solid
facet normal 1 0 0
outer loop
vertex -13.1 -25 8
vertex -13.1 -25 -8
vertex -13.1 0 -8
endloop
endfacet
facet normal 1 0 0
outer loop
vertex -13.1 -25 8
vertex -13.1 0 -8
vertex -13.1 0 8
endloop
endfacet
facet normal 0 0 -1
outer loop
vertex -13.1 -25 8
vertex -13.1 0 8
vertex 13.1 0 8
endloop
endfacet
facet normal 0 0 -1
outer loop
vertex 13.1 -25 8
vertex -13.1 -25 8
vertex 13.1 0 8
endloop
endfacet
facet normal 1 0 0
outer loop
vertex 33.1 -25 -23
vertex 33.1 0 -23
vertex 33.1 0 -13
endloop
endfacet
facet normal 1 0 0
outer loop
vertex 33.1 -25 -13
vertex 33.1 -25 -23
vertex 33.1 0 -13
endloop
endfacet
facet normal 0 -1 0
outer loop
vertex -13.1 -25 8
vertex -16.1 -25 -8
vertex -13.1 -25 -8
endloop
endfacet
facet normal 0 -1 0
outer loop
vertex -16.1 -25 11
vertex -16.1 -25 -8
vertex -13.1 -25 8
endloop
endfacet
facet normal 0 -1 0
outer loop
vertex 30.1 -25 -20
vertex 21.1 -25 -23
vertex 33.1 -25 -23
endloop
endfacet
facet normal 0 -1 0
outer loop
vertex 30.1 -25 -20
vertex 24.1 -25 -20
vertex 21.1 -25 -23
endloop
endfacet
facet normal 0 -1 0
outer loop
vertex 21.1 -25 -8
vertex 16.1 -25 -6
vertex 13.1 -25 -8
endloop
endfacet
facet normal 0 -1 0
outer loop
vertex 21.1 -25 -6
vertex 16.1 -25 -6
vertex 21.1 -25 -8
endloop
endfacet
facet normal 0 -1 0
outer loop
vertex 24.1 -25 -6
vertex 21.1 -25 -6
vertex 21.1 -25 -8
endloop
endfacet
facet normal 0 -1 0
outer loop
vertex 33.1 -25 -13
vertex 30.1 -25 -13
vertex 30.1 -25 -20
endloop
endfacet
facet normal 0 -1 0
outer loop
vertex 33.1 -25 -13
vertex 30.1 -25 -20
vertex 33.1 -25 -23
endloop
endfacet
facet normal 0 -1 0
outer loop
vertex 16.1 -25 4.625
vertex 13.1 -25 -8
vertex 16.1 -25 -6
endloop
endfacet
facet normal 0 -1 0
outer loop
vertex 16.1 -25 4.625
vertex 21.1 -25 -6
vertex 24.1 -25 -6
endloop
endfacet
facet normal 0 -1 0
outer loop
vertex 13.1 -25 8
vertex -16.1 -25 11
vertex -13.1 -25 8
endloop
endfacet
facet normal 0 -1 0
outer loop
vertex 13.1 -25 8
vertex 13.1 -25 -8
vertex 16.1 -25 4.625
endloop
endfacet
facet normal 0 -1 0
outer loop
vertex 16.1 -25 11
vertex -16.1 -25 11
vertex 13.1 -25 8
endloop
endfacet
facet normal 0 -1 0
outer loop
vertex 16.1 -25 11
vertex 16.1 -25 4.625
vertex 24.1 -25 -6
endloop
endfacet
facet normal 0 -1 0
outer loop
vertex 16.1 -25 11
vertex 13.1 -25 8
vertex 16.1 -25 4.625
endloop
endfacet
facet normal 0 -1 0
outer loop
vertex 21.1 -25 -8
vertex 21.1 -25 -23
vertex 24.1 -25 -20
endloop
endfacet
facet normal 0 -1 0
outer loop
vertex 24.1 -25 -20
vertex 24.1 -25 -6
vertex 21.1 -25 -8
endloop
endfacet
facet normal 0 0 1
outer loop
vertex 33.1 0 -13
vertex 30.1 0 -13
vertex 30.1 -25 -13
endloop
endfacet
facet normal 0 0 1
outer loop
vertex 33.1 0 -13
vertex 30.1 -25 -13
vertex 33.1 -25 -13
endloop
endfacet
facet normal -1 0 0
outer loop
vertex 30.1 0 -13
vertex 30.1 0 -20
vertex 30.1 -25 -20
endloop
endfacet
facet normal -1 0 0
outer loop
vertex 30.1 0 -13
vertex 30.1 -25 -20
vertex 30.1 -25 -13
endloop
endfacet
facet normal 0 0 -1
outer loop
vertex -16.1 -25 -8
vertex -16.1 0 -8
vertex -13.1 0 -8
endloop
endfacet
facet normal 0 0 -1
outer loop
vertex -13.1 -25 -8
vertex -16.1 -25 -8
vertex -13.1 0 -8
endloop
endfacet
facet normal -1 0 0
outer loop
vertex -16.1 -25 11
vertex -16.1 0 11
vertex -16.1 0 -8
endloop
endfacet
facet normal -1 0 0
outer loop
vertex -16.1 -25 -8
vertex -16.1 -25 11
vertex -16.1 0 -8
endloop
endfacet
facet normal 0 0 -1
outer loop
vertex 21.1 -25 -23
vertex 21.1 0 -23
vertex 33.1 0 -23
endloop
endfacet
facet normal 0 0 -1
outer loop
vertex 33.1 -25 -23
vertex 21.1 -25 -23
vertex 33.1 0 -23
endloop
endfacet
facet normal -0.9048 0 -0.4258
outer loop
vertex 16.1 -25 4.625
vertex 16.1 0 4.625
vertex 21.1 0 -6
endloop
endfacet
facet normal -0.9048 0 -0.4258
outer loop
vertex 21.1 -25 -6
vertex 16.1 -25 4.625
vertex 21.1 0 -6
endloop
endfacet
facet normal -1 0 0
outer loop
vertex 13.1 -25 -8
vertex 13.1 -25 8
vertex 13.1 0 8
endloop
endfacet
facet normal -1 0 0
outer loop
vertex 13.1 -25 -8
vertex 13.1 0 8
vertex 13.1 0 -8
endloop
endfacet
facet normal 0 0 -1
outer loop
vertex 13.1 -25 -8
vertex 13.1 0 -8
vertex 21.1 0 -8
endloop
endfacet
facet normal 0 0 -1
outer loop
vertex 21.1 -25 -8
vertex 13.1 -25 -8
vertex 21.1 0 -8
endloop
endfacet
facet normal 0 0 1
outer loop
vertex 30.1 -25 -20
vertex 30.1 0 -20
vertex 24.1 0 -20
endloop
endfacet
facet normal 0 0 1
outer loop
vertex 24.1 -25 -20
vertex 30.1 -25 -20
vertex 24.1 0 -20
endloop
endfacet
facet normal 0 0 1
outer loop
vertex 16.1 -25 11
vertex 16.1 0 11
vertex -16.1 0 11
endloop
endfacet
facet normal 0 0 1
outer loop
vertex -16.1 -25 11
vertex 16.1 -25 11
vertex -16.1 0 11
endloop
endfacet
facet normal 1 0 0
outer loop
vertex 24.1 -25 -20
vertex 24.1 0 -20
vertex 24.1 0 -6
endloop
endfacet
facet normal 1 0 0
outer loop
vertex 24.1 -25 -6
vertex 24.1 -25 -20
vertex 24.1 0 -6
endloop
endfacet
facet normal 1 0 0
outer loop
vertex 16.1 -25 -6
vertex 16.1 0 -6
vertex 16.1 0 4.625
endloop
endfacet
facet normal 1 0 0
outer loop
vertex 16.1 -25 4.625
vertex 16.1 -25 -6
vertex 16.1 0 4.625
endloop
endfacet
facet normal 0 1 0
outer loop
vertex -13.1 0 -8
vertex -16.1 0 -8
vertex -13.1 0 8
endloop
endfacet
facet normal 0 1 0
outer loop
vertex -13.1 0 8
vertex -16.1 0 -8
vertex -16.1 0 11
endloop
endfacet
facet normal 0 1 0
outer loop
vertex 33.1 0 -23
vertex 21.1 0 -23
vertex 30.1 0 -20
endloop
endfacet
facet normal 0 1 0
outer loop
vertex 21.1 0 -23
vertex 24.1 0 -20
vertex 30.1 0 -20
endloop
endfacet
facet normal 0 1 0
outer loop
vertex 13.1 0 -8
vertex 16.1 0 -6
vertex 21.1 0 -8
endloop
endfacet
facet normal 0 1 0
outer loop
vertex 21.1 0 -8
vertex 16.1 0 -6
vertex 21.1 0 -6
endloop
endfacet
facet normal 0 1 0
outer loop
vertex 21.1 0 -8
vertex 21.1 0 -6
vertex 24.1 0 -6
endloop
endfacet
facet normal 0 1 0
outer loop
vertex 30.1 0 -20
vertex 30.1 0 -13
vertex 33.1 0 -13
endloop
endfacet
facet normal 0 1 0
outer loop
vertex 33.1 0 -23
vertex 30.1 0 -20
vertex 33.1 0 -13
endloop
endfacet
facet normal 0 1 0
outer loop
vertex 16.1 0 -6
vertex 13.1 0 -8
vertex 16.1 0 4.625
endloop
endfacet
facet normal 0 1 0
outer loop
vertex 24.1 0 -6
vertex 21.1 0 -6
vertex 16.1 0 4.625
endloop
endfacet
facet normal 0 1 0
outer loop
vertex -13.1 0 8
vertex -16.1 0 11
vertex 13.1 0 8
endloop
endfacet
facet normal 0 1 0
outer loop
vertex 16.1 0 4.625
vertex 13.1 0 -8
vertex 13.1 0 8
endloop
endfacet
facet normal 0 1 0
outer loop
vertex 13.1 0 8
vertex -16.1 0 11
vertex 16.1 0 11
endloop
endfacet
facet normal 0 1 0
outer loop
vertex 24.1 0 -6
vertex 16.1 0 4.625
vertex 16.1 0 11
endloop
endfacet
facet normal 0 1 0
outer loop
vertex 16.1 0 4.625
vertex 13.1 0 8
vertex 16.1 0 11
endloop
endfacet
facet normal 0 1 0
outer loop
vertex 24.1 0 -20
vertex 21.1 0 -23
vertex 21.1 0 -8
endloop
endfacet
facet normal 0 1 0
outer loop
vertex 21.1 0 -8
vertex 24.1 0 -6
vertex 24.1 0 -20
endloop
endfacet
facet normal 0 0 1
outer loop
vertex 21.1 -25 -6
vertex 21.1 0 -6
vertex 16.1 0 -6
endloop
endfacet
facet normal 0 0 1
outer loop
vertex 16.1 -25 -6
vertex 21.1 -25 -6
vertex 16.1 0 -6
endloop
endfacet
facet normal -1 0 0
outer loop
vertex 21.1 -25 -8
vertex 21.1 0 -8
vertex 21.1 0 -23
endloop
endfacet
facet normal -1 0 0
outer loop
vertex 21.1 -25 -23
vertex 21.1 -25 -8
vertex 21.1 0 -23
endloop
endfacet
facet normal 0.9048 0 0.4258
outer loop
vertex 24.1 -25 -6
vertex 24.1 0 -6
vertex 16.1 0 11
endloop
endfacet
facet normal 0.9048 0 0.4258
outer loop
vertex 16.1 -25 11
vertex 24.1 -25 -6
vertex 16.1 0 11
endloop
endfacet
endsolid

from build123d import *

# Parameters (mm, degrees)
F0_W     = 3
F0_H     = 16
F0_H_2   = 3
F0_W_2   = 26.2
F0_H_3   = 7
F1_DEPTH = 25


with BuildPart() as f1:
    # F0 (on Front) → F1 (new body)
    with BuildSketch(Plane.XZ):
        with Locations((-14.6, 0)):
            Rectangle(F0_W, F0_H)
        with Locations((-14.6, 9.5)):
            Rectangle(F0_W, F0_H_2)
        with Locations((0, 9.5)):
            Rectangle(F0_W_2, F0_H_2)
        with Locations((14.6, 9.5)):
            Rectangle(F0_W, F0_H_2)
        Polygon((13.1, 8), (13.1, -8), (16.1, -8), (16.1, -6), (16.1, 4.625), (16.1, 8), align=None)
        Polygon((16.1, 11), (16.1, 8), (16.1, 4.625), (21.1, -6), (24.1, -6), align=None)
        Polygon((16.1, -6), (16.1, -8), (21.1, -8), (24.1, -8), (24.1, -6), (21.1, -6), align=None)
        Polygon((24.1, -8), (21.1, -8), (21.1, -23), (24.1, -23), (24.1, -20), align=None)
        Polygon((30.1, -20), (24.1, -20), (24.1, -23), (33.1, -23), (33.1, -20), align=None)
        with Locations((31.6, -16.5)):
            Rectangle(F0_W, F0_H_3)
    extrude(amount=F1_DEPTH)


solid = f1.part
